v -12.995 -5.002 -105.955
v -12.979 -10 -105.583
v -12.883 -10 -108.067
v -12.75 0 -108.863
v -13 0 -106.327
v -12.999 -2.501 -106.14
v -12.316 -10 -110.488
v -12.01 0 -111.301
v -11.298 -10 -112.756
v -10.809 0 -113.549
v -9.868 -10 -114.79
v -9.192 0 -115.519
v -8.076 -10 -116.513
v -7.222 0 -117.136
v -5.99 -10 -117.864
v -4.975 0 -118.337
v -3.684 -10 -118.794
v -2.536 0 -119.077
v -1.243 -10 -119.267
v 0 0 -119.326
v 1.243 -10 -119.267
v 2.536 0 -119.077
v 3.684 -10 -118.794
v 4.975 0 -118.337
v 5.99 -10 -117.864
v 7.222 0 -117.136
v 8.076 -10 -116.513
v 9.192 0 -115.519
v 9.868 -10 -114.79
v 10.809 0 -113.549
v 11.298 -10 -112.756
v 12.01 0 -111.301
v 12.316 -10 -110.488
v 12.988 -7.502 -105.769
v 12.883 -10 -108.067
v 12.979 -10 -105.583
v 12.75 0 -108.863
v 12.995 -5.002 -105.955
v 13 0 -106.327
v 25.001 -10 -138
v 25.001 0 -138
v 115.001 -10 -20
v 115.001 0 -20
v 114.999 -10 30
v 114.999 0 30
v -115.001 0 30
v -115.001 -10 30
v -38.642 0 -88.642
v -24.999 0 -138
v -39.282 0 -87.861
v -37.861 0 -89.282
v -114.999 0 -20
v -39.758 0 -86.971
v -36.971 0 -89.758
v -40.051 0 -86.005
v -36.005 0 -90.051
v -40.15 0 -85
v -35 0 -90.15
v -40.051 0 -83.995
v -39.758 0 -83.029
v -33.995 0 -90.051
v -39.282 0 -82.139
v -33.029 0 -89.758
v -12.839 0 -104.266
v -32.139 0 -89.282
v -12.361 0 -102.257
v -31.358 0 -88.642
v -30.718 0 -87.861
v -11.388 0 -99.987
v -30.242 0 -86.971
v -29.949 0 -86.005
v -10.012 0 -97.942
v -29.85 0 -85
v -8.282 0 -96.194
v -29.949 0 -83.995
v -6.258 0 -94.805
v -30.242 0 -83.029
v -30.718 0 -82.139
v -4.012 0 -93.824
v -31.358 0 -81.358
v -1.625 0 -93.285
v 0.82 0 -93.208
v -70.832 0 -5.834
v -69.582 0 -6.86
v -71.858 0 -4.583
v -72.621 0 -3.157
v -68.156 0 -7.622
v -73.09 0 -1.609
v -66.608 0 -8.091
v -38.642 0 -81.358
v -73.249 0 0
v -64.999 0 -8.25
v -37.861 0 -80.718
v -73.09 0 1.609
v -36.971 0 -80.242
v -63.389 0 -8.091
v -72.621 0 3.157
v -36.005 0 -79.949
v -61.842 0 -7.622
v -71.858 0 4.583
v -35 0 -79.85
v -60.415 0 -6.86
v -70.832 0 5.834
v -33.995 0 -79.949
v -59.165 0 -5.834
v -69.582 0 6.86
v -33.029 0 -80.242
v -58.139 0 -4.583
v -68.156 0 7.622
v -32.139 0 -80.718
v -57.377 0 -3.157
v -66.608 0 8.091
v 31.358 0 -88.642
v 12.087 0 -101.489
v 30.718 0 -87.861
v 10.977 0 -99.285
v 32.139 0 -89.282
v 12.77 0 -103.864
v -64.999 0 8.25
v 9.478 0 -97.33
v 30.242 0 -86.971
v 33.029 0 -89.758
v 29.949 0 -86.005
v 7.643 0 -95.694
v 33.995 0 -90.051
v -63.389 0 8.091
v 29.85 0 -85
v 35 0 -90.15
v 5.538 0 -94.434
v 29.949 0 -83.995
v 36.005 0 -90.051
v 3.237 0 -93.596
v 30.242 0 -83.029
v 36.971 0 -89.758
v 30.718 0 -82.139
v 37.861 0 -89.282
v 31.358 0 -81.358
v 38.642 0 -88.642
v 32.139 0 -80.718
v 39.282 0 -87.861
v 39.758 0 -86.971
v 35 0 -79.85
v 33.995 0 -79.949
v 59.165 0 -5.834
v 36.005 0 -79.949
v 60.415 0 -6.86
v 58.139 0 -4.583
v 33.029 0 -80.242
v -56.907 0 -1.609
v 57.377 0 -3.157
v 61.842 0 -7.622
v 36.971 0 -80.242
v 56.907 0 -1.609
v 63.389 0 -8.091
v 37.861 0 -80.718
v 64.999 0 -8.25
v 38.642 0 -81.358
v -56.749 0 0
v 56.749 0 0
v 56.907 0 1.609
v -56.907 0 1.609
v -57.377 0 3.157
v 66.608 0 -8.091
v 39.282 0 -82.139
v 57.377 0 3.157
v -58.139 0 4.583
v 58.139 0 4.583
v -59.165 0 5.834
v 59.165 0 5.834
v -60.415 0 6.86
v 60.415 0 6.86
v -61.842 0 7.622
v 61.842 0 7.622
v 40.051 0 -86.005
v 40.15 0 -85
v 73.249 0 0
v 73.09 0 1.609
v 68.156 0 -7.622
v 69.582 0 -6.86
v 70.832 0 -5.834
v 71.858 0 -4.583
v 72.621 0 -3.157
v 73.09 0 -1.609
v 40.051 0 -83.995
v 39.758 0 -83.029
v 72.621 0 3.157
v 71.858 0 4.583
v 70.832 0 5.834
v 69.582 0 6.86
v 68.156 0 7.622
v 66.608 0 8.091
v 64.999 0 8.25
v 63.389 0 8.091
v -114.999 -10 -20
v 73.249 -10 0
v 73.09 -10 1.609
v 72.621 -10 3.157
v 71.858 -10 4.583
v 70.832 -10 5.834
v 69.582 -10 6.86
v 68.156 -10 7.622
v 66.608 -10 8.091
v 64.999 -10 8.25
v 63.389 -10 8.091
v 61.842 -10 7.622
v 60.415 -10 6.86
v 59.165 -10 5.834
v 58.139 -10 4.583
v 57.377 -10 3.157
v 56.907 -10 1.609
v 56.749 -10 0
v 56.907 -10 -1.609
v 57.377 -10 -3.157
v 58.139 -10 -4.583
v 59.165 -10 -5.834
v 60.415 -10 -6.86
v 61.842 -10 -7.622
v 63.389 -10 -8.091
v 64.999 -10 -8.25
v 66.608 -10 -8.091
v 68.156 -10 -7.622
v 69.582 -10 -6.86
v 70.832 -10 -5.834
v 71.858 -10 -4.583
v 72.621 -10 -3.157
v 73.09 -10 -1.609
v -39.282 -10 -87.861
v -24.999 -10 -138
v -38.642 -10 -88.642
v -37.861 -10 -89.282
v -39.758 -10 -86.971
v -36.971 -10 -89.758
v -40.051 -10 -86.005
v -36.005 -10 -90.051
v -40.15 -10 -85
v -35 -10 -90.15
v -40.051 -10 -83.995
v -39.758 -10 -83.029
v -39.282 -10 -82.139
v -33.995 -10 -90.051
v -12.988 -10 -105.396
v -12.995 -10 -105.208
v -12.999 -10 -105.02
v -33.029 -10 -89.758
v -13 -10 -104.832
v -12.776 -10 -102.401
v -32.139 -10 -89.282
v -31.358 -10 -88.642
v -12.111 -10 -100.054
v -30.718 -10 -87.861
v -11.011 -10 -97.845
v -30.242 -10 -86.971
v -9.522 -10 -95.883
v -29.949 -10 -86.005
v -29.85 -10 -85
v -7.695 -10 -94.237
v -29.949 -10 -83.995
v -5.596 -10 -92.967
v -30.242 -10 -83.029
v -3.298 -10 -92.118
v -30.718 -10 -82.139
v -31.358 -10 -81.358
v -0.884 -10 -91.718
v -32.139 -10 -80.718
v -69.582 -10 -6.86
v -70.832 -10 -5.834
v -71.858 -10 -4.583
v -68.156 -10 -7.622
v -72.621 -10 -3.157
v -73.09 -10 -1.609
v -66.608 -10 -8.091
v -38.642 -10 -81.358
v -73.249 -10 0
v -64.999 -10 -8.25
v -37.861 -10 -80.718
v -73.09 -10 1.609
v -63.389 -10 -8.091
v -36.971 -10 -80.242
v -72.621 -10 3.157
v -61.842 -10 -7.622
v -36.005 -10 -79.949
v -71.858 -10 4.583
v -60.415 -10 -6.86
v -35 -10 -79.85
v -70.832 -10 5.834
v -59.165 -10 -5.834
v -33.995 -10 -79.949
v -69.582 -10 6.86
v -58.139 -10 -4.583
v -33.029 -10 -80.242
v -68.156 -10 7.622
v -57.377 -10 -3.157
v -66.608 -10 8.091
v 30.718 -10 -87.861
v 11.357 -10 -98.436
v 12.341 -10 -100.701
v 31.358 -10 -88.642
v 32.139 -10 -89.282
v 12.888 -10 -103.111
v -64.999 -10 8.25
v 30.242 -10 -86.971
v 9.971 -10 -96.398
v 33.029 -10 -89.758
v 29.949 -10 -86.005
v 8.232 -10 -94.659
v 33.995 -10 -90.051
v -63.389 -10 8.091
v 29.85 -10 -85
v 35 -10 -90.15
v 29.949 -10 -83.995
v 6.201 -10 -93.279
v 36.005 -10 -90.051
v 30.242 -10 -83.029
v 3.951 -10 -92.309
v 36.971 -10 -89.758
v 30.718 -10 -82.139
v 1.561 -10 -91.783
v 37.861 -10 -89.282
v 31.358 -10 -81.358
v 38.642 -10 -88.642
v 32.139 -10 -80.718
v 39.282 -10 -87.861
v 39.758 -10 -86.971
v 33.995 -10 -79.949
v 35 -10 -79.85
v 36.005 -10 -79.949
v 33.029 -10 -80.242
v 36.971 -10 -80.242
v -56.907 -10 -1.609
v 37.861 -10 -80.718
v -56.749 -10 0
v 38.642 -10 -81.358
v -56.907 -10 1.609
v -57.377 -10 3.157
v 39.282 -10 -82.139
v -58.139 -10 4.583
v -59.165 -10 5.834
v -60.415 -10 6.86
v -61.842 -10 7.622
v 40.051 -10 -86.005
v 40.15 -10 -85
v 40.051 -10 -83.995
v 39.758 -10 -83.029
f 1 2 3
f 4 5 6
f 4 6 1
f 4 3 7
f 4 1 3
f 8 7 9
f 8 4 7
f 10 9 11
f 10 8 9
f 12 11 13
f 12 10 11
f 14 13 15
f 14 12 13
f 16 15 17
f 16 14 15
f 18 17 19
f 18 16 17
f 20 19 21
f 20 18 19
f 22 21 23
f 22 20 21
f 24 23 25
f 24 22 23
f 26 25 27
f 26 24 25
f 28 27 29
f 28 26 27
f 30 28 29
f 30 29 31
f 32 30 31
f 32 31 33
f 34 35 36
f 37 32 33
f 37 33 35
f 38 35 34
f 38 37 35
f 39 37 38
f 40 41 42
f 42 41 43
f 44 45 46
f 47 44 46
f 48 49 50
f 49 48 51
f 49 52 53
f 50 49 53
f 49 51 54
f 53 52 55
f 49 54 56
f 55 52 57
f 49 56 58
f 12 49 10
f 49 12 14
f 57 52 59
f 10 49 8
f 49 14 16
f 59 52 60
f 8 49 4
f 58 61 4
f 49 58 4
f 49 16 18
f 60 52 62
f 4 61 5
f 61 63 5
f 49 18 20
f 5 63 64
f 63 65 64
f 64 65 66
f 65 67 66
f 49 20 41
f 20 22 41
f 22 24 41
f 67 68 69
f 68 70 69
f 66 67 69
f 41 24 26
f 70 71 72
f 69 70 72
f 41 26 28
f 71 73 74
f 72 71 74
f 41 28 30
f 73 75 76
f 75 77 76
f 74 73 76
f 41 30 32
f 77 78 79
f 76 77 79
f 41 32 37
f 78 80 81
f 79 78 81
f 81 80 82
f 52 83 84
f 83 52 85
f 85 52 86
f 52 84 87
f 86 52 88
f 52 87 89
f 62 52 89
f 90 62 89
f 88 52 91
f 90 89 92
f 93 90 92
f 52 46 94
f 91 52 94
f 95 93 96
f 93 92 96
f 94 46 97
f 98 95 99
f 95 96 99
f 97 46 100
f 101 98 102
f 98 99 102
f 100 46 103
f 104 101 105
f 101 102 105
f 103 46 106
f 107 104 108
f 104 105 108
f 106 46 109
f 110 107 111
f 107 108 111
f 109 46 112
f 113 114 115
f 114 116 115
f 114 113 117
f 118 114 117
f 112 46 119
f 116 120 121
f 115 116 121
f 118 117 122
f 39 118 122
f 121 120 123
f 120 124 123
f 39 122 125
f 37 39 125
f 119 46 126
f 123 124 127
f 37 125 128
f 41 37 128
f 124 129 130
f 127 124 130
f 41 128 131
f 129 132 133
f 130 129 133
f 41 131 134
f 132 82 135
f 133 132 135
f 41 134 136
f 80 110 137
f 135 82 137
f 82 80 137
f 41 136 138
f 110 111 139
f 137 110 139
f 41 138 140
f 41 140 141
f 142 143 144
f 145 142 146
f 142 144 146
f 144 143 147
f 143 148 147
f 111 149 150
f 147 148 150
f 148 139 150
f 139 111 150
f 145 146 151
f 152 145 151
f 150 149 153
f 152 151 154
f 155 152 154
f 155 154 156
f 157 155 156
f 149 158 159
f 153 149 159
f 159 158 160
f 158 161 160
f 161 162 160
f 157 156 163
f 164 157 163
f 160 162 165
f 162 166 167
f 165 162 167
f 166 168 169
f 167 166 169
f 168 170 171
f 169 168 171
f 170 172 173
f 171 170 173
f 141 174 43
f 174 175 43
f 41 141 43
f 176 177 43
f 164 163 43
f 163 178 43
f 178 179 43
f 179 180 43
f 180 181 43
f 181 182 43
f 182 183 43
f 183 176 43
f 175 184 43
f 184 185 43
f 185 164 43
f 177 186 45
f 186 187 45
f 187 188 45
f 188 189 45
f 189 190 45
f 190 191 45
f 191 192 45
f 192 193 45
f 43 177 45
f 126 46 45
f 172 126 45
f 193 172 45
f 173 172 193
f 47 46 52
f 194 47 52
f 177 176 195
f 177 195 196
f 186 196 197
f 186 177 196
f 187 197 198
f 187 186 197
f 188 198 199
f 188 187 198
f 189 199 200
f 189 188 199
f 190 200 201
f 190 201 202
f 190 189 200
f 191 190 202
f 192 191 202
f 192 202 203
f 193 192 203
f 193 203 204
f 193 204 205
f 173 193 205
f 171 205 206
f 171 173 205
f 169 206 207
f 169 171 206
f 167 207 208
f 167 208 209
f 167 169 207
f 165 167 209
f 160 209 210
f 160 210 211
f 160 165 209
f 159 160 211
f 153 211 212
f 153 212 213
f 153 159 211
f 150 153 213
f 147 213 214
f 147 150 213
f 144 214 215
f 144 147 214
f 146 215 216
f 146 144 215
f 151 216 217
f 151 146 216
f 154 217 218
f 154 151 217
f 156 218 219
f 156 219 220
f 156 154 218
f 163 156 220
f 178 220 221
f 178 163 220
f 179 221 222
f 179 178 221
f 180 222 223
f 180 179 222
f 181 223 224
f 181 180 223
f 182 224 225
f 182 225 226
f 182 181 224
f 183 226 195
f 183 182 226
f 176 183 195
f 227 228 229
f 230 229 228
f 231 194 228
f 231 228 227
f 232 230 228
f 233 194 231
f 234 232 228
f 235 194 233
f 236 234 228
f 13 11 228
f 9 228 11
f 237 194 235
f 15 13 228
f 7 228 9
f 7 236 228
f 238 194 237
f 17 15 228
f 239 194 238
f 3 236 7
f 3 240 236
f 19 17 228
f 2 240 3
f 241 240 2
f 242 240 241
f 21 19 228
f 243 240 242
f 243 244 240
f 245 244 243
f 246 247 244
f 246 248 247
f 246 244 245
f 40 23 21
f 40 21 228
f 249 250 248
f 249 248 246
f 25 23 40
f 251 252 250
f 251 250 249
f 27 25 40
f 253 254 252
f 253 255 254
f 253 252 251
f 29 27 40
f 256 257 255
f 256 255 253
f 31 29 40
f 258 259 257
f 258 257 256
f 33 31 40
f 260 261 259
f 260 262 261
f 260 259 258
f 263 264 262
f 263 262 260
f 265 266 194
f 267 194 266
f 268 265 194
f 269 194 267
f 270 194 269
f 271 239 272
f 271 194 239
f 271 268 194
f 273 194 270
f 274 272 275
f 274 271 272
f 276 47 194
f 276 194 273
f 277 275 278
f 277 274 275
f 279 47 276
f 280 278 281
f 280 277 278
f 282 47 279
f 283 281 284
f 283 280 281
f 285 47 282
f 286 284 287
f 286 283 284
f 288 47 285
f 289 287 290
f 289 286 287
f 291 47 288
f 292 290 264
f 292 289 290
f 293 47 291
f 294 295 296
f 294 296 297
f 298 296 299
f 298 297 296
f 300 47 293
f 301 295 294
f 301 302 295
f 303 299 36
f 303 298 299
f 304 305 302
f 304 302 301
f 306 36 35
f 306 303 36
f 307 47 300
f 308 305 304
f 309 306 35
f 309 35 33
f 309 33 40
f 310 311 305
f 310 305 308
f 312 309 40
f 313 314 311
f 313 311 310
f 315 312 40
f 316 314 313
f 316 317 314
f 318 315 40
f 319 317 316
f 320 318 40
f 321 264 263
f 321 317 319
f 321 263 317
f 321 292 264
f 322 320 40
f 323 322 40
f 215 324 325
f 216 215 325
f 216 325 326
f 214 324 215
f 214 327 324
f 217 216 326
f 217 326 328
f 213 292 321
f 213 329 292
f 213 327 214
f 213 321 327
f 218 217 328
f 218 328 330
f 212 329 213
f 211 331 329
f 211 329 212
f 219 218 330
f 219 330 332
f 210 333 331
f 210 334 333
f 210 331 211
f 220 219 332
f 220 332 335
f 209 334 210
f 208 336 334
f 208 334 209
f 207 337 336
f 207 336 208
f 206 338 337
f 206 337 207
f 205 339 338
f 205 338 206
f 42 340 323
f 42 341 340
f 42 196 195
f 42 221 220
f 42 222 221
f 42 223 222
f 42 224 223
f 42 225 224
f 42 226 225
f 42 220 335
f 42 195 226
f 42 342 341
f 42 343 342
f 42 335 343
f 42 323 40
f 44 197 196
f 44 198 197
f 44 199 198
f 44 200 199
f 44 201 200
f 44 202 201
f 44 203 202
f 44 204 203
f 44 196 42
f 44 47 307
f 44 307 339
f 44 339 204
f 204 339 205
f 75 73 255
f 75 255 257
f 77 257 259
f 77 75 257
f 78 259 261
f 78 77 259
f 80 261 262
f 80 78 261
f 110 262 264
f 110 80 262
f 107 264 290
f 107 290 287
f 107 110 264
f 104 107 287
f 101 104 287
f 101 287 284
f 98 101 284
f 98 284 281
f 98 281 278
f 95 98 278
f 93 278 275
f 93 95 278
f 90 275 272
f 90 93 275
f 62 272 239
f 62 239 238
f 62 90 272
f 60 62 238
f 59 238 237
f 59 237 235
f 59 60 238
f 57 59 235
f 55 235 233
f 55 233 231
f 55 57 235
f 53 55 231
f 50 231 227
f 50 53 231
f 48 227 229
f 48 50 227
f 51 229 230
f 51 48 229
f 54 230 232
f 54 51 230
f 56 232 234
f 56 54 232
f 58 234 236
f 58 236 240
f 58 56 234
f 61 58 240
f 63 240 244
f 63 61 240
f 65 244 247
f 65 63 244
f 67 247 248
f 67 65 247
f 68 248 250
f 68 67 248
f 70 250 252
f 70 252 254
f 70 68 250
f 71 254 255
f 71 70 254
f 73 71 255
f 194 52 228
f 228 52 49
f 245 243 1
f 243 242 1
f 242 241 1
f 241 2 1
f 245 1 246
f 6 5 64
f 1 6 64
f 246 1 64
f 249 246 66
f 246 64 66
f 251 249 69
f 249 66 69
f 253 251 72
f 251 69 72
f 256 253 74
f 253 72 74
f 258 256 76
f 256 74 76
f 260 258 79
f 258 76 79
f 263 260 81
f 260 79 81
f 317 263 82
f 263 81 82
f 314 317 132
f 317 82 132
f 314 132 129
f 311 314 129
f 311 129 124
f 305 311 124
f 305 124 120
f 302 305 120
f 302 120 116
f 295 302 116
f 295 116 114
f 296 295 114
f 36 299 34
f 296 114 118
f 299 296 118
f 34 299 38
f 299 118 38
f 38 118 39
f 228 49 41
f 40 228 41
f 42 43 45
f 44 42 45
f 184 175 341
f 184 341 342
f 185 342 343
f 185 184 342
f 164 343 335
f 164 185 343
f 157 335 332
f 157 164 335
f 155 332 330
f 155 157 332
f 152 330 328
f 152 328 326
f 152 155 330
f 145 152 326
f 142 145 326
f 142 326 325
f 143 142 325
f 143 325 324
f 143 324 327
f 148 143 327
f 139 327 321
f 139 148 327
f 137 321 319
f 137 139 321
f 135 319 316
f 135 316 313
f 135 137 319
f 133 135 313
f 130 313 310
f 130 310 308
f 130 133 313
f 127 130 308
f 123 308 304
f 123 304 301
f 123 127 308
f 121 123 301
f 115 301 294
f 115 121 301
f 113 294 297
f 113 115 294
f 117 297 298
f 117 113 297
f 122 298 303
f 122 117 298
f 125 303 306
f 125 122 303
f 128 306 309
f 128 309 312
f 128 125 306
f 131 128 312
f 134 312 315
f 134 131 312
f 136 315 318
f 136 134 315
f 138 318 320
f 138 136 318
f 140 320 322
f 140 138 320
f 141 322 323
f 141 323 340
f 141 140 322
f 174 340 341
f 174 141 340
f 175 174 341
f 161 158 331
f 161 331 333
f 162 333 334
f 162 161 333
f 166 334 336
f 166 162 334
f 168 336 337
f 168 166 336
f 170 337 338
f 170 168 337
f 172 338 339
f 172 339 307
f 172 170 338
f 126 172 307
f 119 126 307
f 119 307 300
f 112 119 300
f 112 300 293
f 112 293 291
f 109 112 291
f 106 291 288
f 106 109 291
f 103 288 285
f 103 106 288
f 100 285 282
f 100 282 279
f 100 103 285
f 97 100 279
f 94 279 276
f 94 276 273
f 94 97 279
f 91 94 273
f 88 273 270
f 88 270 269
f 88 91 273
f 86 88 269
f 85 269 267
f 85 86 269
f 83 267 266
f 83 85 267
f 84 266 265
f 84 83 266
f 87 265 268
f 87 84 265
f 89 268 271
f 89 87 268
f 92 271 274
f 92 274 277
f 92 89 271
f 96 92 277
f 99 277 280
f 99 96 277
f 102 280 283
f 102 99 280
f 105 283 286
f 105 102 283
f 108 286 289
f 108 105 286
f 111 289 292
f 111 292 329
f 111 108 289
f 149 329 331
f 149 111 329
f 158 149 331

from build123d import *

# Parameters (mm, degrees)
F0_R     = 5.15
F0_R_2   = 13
F0_R_3   = 8.25
F1_DEPTH = 10
F3_R     = 13
F4_DEPTH = 30.041475


with BuildPart() as f1:
    # F0 (on Front) → F1 (new body)
    with BuildSketch(Plane.XZ):
        Polygon((115.000841, -20), (114.998738, 30), (-115.001262, 30), (-114.999159, -20), (-24.999159, -138), (25.000841, -138), align=None)
        with Locations((-35, -85)):
            Circle(F0_R, mode=Mode.SUBTRACT)
        with Locations((0, -106.326342)):
            Circle(F0_R_2, mode=Mode.SUBTRACT)
        with Locations((35, -85)):
            Circle(F0_R, mode=Mode.SUBTRACT)
        with Locations((-64.998738, 0)):
            Circle(F0_R_3, mode=Mode.SUBTRACT)
        with Locations((64.998738, 0)):
            Circle(F0_R_3, mode=Mode.SUBTRACT)
    extrude(amount=F1_DEPTH)

    # F3 (on face) → F4 (cut, through all)
    with BuildSketch(Plane(origin=(0, 15.543407, -2.322978), x_dir=(-1, 0, 0), z_dir=(0, 0.989016, -0.147809))):
        with Locations((0, -105.158439)):
            Circle(F3_R)
    extrude(amount=-F4_DEPTH, mode=Mode.SUBTRACT)


solid = f1.part
